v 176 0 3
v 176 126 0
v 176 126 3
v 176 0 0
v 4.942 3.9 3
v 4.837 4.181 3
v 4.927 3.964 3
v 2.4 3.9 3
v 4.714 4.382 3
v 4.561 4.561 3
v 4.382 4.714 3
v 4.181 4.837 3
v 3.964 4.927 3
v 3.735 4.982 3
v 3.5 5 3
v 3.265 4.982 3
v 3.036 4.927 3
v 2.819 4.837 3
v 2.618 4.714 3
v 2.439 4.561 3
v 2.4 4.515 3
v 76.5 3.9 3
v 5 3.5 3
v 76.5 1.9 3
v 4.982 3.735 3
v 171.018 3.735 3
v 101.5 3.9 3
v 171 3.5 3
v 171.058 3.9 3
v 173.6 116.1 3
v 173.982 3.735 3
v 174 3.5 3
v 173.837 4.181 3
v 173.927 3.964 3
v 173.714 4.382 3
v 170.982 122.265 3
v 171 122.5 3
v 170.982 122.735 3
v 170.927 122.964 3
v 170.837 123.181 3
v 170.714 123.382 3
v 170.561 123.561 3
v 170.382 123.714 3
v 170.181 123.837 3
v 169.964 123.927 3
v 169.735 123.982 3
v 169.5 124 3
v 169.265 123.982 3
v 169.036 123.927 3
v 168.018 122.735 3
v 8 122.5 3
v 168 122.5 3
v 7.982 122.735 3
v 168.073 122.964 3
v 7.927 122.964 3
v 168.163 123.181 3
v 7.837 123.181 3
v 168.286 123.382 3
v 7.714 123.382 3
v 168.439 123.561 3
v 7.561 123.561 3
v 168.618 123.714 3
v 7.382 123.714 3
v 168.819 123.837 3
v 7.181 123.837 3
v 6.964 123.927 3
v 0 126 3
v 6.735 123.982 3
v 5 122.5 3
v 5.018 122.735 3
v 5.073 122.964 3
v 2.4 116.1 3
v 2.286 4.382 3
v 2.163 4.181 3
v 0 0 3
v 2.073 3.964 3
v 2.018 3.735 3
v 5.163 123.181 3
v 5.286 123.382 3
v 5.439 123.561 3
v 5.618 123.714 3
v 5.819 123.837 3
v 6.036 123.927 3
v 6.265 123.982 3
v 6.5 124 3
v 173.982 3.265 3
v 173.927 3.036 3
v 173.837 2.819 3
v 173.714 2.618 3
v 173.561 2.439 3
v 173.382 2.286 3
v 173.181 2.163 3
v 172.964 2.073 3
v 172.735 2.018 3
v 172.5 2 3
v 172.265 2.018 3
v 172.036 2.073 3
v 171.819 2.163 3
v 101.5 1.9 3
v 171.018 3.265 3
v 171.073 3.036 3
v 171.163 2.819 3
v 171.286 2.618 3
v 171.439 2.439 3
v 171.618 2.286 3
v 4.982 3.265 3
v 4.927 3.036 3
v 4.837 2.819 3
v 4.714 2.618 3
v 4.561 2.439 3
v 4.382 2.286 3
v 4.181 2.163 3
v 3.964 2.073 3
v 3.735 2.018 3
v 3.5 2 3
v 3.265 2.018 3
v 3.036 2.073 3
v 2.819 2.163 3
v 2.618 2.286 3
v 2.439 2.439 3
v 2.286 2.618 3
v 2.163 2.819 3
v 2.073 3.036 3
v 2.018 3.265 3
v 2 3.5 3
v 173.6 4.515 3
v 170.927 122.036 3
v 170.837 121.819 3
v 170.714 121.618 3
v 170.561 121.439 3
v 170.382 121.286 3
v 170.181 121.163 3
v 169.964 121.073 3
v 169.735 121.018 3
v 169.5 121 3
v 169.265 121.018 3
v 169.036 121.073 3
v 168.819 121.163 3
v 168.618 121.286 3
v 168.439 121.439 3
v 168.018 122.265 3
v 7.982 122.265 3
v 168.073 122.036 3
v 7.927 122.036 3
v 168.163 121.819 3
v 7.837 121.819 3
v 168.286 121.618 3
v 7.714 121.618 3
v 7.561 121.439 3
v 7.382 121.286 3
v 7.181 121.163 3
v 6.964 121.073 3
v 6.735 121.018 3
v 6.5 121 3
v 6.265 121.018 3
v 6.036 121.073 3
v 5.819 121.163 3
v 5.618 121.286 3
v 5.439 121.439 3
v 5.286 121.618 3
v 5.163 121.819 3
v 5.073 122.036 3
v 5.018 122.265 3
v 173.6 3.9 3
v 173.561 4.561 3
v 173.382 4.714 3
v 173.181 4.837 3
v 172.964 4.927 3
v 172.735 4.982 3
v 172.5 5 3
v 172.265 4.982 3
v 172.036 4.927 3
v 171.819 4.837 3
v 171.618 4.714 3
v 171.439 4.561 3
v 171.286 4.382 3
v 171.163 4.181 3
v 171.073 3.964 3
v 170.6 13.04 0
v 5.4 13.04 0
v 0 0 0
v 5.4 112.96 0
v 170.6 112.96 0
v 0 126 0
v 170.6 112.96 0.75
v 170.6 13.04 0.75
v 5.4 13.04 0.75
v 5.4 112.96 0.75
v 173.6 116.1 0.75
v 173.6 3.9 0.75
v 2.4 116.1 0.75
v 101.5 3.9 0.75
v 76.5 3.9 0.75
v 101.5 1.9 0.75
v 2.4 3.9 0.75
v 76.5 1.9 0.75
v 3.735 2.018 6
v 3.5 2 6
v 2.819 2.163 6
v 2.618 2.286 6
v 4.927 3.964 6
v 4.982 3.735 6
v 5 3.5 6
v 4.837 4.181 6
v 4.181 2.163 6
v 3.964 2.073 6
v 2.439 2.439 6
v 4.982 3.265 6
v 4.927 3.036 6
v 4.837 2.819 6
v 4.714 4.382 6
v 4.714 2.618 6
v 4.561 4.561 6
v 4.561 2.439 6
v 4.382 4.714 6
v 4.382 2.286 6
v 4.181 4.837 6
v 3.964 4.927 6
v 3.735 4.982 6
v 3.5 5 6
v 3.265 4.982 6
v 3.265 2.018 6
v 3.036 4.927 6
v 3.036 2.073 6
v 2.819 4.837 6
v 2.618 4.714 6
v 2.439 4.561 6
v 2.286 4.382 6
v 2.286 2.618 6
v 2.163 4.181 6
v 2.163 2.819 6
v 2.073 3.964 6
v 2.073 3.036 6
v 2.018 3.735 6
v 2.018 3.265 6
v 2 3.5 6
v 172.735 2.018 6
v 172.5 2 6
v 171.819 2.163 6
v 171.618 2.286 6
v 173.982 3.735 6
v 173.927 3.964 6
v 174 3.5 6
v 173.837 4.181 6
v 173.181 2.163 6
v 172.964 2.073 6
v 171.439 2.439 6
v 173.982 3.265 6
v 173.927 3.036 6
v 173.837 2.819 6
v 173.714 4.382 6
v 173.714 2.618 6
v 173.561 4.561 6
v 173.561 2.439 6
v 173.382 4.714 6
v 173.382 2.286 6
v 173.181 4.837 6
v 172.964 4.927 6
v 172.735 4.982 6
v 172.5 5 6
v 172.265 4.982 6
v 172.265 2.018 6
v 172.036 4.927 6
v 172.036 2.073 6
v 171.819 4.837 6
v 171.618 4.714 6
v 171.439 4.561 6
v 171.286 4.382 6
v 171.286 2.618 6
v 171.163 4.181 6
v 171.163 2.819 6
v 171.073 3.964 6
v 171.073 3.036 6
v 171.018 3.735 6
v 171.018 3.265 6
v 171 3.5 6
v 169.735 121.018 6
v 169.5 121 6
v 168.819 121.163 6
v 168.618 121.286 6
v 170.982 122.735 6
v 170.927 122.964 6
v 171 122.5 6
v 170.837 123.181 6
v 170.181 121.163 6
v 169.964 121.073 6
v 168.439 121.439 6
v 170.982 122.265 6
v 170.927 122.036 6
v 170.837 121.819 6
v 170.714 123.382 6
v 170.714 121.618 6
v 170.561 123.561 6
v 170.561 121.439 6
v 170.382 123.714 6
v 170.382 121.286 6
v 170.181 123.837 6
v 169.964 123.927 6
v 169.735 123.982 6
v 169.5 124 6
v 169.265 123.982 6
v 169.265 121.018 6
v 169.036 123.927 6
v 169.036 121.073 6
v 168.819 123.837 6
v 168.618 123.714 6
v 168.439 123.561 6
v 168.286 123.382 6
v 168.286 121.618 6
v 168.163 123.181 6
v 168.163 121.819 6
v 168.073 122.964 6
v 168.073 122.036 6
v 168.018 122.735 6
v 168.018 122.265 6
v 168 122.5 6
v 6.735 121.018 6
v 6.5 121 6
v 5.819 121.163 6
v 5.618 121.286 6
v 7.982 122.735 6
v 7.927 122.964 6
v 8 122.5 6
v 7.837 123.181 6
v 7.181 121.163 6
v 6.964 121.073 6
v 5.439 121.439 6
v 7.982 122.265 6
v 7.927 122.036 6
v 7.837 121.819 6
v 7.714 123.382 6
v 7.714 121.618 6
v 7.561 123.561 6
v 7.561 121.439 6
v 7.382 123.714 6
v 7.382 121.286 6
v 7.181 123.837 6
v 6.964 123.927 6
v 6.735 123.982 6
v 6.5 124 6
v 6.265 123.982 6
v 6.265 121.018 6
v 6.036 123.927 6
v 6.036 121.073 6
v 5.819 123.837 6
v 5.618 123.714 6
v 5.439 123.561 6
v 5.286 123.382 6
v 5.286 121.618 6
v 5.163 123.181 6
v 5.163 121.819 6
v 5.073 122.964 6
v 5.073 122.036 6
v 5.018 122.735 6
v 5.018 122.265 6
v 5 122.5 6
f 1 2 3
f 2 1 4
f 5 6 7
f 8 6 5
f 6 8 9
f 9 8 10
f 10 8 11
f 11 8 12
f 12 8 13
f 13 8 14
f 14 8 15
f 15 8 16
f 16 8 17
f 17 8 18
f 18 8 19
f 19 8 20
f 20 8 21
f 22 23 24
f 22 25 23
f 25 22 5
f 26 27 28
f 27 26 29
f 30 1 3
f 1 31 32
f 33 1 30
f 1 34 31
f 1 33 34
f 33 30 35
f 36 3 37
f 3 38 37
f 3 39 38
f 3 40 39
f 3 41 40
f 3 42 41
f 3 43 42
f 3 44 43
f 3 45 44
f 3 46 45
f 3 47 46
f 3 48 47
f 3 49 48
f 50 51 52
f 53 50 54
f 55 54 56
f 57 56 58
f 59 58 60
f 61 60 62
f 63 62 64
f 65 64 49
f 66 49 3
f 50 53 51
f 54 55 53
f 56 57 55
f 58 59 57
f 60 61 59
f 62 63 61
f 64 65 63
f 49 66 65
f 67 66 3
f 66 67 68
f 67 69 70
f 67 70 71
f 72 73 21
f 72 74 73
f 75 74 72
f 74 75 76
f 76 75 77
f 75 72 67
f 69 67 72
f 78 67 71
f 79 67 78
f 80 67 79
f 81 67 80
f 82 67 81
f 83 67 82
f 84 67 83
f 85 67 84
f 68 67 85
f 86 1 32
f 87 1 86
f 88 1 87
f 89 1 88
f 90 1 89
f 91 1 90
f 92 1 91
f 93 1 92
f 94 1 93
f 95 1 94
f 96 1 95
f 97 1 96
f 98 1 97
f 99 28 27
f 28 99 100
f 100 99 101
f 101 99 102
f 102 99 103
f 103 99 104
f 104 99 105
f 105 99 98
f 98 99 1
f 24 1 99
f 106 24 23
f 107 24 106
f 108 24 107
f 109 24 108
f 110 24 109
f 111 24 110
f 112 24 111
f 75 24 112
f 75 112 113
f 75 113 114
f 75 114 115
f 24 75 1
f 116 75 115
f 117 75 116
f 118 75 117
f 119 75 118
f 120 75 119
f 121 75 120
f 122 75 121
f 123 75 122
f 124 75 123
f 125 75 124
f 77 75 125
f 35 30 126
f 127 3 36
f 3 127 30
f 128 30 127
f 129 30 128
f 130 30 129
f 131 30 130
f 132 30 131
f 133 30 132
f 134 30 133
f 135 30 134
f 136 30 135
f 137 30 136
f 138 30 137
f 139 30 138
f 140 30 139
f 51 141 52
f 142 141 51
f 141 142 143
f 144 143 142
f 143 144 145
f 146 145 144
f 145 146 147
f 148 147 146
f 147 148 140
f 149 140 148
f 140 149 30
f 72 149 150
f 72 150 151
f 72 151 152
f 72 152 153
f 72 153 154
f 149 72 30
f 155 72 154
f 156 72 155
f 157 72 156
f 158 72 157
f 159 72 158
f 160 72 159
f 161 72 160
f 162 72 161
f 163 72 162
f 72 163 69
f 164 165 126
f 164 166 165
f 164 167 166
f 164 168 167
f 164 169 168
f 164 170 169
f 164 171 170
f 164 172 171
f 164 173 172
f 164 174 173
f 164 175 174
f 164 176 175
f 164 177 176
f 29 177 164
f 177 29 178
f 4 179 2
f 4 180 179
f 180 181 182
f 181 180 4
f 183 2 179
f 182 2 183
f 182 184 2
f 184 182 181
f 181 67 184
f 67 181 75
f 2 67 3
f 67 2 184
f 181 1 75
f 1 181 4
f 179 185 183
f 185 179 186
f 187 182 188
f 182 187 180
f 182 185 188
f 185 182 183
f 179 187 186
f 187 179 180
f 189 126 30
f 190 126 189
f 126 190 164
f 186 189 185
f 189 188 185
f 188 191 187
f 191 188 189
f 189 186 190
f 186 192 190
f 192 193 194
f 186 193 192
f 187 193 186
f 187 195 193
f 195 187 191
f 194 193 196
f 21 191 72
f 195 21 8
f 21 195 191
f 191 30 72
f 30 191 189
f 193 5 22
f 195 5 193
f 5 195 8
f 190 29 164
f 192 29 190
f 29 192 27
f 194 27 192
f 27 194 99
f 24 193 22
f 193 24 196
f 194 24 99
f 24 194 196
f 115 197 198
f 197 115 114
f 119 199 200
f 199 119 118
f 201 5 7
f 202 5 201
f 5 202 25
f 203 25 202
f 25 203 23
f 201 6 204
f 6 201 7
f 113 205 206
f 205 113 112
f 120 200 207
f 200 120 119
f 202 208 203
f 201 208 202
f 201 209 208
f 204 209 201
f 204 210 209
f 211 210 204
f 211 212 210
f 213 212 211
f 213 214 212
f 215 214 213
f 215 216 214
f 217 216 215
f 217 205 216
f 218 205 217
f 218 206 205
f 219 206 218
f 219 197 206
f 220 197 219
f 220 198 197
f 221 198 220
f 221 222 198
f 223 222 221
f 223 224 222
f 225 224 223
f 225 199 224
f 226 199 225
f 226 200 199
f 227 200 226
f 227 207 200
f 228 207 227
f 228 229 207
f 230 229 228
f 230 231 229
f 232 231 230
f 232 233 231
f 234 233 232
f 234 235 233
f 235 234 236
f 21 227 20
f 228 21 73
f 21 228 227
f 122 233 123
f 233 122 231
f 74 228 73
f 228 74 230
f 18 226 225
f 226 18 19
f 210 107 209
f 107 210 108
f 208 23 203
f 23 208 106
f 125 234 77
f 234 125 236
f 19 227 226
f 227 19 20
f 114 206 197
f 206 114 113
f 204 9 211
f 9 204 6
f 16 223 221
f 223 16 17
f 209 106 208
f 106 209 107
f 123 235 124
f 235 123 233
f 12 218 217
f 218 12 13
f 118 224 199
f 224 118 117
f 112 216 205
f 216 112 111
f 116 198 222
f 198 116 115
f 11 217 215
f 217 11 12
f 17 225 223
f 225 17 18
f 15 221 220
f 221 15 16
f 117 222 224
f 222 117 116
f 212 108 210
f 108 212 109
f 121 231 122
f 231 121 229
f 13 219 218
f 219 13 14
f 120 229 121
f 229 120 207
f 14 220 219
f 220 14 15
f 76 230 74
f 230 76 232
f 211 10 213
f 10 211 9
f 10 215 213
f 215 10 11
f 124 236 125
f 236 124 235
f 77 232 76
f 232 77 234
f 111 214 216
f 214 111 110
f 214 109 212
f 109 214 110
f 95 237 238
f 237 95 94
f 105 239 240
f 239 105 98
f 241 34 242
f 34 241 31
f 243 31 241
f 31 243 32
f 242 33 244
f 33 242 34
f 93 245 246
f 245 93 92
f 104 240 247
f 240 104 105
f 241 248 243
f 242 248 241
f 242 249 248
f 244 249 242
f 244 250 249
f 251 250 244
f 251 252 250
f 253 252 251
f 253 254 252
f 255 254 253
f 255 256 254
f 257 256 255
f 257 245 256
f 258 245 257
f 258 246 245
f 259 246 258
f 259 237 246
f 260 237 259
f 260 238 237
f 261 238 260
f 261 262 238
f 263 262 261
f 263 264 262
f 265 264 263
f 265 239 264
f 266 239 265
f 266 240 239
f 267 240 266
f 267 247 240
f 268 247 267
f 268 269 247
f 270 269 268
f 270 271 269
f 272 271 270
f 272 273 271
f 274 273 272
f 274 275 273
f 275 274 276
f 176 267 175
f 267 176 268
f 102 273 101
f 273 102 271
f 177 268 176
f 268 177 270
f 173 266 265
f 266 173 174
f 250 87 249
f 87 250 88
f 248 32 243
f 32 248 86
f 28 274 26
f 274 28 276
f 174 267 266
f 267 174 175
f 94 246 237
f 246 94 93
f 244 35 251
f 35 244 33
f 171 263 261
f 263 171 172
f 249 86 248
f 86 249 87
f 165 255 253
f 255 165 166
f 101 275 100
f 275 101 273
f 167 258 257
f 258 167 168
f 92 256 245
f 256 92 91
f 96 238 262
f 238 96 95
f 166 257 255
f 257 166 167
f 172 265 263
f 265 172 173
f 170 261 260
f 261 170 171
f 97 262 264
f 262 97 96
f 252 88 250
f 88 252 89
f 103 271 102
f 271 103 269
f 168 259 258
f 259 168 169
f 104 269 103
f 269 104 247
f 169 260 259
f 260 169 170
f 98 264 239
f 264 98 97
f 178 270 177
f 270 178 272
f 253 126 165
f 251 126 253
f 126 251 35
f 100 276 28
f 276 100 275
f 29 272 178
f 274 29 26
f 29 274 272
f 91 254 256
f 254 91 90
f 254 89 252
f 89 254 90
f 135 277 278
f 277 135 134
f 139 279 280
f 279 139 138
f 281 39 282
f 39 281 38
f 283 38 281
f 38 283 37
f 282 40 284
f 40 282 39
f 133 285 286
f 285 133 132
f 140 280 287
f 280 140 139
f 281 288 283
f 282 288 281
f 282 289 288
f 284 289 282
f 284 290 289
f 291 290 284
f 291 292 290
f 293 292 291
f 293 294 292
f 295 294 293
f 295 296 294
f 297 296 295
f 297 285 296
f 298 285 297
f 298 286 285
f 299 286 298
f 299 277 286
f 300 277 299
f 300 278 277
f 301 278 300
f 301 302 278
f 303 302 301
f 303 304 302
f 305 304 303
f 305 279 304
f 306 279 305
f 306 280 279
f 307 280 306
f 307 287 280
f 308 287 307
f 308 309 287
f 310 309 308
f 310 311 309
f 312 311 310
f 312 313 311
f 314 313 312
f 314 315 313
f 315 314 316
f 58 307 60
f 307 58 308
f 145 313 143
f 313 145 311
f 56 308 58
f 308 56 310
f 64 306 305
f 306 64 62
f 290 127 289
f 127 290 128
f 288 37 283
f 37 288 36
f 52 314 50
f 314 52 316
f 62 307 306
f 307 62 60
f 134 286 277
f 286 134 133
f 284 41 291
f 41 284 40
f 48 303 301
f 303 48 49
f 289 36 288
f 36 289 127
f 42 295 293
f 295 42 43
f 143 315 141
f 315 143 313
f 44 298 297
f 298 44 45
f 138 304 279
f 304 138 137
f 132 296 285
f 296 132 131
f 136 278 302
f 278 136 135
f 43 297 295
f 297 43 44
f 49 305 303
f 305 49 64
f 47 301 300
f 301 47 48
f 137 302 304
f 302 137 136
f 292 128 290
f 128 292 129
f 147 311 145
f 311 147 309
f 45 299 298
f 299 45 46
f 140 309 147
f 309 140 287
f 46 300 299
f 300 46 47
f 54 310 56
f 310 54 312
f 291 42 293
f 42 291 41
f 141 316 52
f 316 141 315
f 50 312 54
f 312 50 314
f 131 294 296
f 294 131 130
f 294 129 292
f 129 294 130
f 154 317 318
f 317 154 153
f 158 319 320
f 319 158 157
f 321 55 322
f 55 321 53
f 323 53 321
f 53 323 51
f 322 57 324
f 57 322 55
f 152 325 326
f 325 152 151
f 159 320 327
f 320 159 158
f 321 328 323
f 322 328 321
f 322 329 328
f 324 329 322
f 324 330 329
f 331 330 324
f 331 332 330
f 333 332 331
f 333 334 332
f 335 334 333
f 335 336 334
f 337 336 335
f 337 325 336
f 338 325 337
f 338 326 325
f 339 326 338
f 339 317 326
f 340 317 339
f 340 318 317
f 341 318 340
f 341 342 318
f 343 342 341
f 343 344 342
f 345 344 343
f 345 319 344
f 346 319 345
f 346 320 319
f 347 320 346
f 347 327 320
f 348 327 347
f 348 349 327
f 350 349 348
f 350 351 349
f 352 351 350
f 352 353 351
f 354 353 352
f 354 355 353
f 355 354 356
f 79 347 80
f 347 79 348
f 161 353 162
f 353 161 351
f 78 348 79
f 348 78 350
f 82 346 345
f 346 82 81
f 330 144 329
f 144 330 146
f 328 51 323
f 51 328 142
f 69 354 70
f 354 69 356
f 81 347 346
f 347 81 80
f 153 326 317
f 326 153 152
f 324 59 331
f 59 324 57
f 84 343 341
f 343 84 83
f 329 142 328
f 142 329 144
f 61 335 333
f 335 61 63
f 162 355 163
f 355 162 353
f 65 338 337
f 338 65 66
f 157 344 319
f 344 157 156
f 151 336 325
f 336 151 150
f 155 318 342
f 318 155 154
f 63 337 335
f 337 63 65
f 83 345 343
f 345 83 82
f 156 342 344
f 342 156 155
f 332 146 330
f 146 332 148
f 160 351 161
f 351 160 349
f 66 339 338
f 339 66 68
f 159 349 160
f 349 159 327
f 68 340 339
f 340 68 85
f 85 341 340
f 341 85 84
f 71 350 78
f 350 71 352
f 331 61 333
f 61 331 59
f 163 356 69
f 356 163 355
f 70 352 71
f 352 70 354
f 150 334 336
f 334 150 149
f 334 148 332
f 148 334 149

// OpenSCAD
// file: vars.scad
// FRAME = The outer dimension of the matte and backing board
//         (Use the inner dimension of the wooden frame as the basis, but remove 0.5-1mm for wiggle room)

// PANEL = The size of the electronic board with the screen
//         (Measure it or get it from the manufacturer's website)

// VIEWPORT = The size of portion that has the pixels to be shown
//           (Best to start with the manufacturer's website - might need a tad modified)

// PIN = The four round holes/pins that connect the matte to the backboard

// BOX = The container for the electronics behind the frame (part of the backing board)

// RIBBON (CUTOUT) = The ribbon cable that goes to the eInk display.  
//				     Cutout = the space to go between the matte and the backing board

// TAB = The connectors that keep the back/matte into the wooden frame (1 stationary, 3 moving tabs)


// All numbers (length/width/etc.) are in millimeter

frame_width = 176; // 6 7/8" + 1mm
frame_height = 126;  // 4 7/8" + 2mm

matte_depth = 3; // was 3 mm (2.75mm is too thin)

backboard_depth = 3; // 3mm

panel_width = 170.2 + 1;// add a 1mm clearance
panel_height = 111.2 + 1;// add a 1mm clearance
panel_depth = 2.25;

viewport_width = 163.2 + 2; 
viewport_height = 97.92 + 2; 

viewport_to_panel_width_offset = 0;
viewport_to_panel_height_offset = -3;

ribbon_cutout_width = 25; // width of cutout for ribbon cable
ribbon_cutout_height = 2;
ribbon_cutout_width_offset = 1;  // + = move right, - = move left (looking from the back)

ribbon_slot_height = 6;

// Alignment pins (which line up the matte with the back board)
pin_width = 3;
pin_offset = 3.5;
pin_up = 3;
pin_back_indent = 3;  // Indent the back pins so that there is only one way the two sides match

// The electronics box (mounted on the back board)
box_width = 140;
box_height = 100;
box_depth  = 23;
box_thickness = 2;

box_corner_post_radius = 5;
box_screw_head_diameter = 5;
box_screw_diameter = 3;

frame_to_box_height_offset = 6;

// Tab - goes into the slot of the frame
backboard_tab_width = 60;
backboard_tab_height = 2.5;
backboard_tab_depth = 1;

// Movable tabs - the round pins connecting the three other sides (beyond the primary tab)
movable_tab_width = 6;
movable_tab_offset = 8;
movable_tab_depth = 4;


// Power Cord cutout (the place where the power cord goes)
power_cord_slot_diameter = 5; // 5mm space for the cable
power_cord_slot_height   = 6; // 10mm of vertical spacing for the slot
power_cord_slot_offset = 30;  // How far the power cord cutout is from the bottom

// Standoffs (for electronic boards)
standoff_screw_diameter = 2.5;
standoff_depth = 4.5;


// backplate
backplate_depth = 4;
backplate_pocket_depth = 1.5;

// stand
stand_angle = 55;
stand_length = 90;  // the size (length) of the rectangular "rod" (was 100)
stand_width = 4;     // the size of the rectangular "rod"
stand_height = 9;    // the size of the rectangular "rod"

// Control how "good" the circles are
$fn = $preview ? 20 : 40;


// Computed items below
frame_bottom_border_height = (frame_height - panel_height)/2 + viewport_to_panel_height_offset;
frame_top_border_height    = (frame_height - panel_height)/2 - viewport_to_panel_height_offset;
pin_height = backboard_depth;

latch_width =  2 * movable_tab_width;
// main file
// FRAME = The inner dimension of the wooden frame
// PANEL = The size of the electronic board with the screen
// VIEWPORT = The size of portion that has the pixels to be shown

include <vars.scad>;

module alignment_pin(x, y) {
    translate([x, y, matte_depth])
    cylinder(pin_height, d=pin_width);
	};
	
module viewport_window()  {
    // The opening is always centered in the matte 
	// The opening is always the same depth as the frame (to make a complete void)
	
    x_offset = (frame_width - viewport_width) / 2;
	y_offset = (frame_height - viewport_height) / 2;
	
    translate([x_offset, y_offset, 0])
    cube([viewport_width, viewport_height, matte_depth]);
	};
      
module panel_holder() {
    x_offset = (frame_width - panel_width) / 2   + viewport_to_panel_width_offset;
	y_offset = (frame_height - panel_height) / 2 + viewport_to_panel_height_offset;
	z_offset = matte_depth - panel_depth;
	
	translate([x_offset, y_offset, z_offset])
    cube([panel_width, panel_height, panel_depth]);
	};

module ribbon_cutout_area() {
	x_offset = (frame_width - ribbon_cutout_width) / 2 + ribbon_cutout_width_offset;
	y_offset = frame_bottom_border_height - ribbon_cutout_height;

    translate([x_offset, y_offset, matte_depth - panel_depth])
		cube([ribbon_cutout_width, ribbon_cutout_height, panel_depth]); 
    }; 
	  
module base_matte()
    cube([frame_width, frame_height, matte_depth]);
			 
module front_mat () 
    union() {
        
    // Create the frame centers x/y, but z=0

    difference() {
		base_matte();
        
        // Cut out the space for the display
        //  (aka the part you can see)
        viewport_window();

        // Cut out the space for the panel
        //  (aka whole the electronic board for the e-paper)
        panel_holder();
              
        // Leave space for ribbon cable
        ribbon_cutout_area();
    };
    
    // Front
    alignment_pin(pin_offset, pin_offset);
    alignment_pin(frame_width-pin_offset, pin_offset);
    
    // Back
    alignment_pin(frame_width-pin_offset-pin_back_indent, frame_height-pin_offset);
    alignment_pin(pin_offset+pin_back_indent, frame_height-pin_offset);   
    };
 

front_mat();
